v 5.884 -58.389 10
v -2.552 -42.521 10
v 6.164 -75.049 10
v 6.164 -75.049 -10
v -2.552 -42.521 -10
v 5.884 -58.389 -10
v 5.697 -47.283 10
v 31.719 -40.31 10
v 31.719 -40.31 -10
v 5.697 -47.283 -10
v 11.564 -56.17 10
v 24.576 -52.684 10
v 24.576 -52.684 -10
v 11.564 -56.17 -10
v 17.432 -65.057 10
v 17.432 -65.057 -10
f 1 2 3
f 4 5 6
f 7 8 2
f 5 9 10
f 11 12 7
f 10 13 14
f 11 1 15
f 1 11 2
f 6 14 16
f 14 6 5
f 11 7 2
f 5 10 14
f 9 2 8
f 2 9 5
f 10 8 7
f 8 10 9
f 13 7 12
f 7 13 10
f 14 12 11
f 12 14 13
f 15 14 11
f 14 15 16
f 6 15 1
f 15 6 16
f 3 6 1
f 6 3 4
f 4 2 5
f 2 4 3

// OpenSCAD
polyhedron(
    points=[
    [-2.55221605790644, -42.5205678841871, 10],
    [31.7194598552339, -40.3102839420935, 10],
    [5.69667591314034, -47.2830678841871, 10],
    [24.5757098552339, -52.6836218986637, 10],
    [11.5643178841871, -56.1700138697105, 10],
    [17.4319598552339, -65.0569598552339, 10],
    [5.88351109576841, -58.3894598552339, 10],
    [6.16376386971051, -75.0490478118041, 10],
    [-2.55221605790644, -42.5205678841871, -10],
    [31.7194598552339, -40.3102839420935, -10],
    [5.69667591314034, -47.2830678841871, -10],
    [24.5757098552339, -52.6836218986637, -10],
    [11.5643178841871, -56.1700138697105, -10],
    [17.4319598552339, -65.0569598552339, -10],
    [5.88351109576841, -58.3894598552339, -10],
    [6.16376386971051, -75.0490478118041, -10],
    ],
    faces=[
        [7,0,6],
        [14,8,15],
        [0,1,2],
        [10,9,8],
        [2,3,4],
        [12,11,10],
        [6,0,4,5],
        [13,12,8,14],
        [0,2,4],
        [12,10,8],
        [0,8,9,1],
        [1,9,10,2],
        [2,10,11,3],
        [3,11,12,4],
        [4,12,13,5],
        [5,13,14,6],
        [6,14,15,7],
        [7,15,8,0],
    ]
);
